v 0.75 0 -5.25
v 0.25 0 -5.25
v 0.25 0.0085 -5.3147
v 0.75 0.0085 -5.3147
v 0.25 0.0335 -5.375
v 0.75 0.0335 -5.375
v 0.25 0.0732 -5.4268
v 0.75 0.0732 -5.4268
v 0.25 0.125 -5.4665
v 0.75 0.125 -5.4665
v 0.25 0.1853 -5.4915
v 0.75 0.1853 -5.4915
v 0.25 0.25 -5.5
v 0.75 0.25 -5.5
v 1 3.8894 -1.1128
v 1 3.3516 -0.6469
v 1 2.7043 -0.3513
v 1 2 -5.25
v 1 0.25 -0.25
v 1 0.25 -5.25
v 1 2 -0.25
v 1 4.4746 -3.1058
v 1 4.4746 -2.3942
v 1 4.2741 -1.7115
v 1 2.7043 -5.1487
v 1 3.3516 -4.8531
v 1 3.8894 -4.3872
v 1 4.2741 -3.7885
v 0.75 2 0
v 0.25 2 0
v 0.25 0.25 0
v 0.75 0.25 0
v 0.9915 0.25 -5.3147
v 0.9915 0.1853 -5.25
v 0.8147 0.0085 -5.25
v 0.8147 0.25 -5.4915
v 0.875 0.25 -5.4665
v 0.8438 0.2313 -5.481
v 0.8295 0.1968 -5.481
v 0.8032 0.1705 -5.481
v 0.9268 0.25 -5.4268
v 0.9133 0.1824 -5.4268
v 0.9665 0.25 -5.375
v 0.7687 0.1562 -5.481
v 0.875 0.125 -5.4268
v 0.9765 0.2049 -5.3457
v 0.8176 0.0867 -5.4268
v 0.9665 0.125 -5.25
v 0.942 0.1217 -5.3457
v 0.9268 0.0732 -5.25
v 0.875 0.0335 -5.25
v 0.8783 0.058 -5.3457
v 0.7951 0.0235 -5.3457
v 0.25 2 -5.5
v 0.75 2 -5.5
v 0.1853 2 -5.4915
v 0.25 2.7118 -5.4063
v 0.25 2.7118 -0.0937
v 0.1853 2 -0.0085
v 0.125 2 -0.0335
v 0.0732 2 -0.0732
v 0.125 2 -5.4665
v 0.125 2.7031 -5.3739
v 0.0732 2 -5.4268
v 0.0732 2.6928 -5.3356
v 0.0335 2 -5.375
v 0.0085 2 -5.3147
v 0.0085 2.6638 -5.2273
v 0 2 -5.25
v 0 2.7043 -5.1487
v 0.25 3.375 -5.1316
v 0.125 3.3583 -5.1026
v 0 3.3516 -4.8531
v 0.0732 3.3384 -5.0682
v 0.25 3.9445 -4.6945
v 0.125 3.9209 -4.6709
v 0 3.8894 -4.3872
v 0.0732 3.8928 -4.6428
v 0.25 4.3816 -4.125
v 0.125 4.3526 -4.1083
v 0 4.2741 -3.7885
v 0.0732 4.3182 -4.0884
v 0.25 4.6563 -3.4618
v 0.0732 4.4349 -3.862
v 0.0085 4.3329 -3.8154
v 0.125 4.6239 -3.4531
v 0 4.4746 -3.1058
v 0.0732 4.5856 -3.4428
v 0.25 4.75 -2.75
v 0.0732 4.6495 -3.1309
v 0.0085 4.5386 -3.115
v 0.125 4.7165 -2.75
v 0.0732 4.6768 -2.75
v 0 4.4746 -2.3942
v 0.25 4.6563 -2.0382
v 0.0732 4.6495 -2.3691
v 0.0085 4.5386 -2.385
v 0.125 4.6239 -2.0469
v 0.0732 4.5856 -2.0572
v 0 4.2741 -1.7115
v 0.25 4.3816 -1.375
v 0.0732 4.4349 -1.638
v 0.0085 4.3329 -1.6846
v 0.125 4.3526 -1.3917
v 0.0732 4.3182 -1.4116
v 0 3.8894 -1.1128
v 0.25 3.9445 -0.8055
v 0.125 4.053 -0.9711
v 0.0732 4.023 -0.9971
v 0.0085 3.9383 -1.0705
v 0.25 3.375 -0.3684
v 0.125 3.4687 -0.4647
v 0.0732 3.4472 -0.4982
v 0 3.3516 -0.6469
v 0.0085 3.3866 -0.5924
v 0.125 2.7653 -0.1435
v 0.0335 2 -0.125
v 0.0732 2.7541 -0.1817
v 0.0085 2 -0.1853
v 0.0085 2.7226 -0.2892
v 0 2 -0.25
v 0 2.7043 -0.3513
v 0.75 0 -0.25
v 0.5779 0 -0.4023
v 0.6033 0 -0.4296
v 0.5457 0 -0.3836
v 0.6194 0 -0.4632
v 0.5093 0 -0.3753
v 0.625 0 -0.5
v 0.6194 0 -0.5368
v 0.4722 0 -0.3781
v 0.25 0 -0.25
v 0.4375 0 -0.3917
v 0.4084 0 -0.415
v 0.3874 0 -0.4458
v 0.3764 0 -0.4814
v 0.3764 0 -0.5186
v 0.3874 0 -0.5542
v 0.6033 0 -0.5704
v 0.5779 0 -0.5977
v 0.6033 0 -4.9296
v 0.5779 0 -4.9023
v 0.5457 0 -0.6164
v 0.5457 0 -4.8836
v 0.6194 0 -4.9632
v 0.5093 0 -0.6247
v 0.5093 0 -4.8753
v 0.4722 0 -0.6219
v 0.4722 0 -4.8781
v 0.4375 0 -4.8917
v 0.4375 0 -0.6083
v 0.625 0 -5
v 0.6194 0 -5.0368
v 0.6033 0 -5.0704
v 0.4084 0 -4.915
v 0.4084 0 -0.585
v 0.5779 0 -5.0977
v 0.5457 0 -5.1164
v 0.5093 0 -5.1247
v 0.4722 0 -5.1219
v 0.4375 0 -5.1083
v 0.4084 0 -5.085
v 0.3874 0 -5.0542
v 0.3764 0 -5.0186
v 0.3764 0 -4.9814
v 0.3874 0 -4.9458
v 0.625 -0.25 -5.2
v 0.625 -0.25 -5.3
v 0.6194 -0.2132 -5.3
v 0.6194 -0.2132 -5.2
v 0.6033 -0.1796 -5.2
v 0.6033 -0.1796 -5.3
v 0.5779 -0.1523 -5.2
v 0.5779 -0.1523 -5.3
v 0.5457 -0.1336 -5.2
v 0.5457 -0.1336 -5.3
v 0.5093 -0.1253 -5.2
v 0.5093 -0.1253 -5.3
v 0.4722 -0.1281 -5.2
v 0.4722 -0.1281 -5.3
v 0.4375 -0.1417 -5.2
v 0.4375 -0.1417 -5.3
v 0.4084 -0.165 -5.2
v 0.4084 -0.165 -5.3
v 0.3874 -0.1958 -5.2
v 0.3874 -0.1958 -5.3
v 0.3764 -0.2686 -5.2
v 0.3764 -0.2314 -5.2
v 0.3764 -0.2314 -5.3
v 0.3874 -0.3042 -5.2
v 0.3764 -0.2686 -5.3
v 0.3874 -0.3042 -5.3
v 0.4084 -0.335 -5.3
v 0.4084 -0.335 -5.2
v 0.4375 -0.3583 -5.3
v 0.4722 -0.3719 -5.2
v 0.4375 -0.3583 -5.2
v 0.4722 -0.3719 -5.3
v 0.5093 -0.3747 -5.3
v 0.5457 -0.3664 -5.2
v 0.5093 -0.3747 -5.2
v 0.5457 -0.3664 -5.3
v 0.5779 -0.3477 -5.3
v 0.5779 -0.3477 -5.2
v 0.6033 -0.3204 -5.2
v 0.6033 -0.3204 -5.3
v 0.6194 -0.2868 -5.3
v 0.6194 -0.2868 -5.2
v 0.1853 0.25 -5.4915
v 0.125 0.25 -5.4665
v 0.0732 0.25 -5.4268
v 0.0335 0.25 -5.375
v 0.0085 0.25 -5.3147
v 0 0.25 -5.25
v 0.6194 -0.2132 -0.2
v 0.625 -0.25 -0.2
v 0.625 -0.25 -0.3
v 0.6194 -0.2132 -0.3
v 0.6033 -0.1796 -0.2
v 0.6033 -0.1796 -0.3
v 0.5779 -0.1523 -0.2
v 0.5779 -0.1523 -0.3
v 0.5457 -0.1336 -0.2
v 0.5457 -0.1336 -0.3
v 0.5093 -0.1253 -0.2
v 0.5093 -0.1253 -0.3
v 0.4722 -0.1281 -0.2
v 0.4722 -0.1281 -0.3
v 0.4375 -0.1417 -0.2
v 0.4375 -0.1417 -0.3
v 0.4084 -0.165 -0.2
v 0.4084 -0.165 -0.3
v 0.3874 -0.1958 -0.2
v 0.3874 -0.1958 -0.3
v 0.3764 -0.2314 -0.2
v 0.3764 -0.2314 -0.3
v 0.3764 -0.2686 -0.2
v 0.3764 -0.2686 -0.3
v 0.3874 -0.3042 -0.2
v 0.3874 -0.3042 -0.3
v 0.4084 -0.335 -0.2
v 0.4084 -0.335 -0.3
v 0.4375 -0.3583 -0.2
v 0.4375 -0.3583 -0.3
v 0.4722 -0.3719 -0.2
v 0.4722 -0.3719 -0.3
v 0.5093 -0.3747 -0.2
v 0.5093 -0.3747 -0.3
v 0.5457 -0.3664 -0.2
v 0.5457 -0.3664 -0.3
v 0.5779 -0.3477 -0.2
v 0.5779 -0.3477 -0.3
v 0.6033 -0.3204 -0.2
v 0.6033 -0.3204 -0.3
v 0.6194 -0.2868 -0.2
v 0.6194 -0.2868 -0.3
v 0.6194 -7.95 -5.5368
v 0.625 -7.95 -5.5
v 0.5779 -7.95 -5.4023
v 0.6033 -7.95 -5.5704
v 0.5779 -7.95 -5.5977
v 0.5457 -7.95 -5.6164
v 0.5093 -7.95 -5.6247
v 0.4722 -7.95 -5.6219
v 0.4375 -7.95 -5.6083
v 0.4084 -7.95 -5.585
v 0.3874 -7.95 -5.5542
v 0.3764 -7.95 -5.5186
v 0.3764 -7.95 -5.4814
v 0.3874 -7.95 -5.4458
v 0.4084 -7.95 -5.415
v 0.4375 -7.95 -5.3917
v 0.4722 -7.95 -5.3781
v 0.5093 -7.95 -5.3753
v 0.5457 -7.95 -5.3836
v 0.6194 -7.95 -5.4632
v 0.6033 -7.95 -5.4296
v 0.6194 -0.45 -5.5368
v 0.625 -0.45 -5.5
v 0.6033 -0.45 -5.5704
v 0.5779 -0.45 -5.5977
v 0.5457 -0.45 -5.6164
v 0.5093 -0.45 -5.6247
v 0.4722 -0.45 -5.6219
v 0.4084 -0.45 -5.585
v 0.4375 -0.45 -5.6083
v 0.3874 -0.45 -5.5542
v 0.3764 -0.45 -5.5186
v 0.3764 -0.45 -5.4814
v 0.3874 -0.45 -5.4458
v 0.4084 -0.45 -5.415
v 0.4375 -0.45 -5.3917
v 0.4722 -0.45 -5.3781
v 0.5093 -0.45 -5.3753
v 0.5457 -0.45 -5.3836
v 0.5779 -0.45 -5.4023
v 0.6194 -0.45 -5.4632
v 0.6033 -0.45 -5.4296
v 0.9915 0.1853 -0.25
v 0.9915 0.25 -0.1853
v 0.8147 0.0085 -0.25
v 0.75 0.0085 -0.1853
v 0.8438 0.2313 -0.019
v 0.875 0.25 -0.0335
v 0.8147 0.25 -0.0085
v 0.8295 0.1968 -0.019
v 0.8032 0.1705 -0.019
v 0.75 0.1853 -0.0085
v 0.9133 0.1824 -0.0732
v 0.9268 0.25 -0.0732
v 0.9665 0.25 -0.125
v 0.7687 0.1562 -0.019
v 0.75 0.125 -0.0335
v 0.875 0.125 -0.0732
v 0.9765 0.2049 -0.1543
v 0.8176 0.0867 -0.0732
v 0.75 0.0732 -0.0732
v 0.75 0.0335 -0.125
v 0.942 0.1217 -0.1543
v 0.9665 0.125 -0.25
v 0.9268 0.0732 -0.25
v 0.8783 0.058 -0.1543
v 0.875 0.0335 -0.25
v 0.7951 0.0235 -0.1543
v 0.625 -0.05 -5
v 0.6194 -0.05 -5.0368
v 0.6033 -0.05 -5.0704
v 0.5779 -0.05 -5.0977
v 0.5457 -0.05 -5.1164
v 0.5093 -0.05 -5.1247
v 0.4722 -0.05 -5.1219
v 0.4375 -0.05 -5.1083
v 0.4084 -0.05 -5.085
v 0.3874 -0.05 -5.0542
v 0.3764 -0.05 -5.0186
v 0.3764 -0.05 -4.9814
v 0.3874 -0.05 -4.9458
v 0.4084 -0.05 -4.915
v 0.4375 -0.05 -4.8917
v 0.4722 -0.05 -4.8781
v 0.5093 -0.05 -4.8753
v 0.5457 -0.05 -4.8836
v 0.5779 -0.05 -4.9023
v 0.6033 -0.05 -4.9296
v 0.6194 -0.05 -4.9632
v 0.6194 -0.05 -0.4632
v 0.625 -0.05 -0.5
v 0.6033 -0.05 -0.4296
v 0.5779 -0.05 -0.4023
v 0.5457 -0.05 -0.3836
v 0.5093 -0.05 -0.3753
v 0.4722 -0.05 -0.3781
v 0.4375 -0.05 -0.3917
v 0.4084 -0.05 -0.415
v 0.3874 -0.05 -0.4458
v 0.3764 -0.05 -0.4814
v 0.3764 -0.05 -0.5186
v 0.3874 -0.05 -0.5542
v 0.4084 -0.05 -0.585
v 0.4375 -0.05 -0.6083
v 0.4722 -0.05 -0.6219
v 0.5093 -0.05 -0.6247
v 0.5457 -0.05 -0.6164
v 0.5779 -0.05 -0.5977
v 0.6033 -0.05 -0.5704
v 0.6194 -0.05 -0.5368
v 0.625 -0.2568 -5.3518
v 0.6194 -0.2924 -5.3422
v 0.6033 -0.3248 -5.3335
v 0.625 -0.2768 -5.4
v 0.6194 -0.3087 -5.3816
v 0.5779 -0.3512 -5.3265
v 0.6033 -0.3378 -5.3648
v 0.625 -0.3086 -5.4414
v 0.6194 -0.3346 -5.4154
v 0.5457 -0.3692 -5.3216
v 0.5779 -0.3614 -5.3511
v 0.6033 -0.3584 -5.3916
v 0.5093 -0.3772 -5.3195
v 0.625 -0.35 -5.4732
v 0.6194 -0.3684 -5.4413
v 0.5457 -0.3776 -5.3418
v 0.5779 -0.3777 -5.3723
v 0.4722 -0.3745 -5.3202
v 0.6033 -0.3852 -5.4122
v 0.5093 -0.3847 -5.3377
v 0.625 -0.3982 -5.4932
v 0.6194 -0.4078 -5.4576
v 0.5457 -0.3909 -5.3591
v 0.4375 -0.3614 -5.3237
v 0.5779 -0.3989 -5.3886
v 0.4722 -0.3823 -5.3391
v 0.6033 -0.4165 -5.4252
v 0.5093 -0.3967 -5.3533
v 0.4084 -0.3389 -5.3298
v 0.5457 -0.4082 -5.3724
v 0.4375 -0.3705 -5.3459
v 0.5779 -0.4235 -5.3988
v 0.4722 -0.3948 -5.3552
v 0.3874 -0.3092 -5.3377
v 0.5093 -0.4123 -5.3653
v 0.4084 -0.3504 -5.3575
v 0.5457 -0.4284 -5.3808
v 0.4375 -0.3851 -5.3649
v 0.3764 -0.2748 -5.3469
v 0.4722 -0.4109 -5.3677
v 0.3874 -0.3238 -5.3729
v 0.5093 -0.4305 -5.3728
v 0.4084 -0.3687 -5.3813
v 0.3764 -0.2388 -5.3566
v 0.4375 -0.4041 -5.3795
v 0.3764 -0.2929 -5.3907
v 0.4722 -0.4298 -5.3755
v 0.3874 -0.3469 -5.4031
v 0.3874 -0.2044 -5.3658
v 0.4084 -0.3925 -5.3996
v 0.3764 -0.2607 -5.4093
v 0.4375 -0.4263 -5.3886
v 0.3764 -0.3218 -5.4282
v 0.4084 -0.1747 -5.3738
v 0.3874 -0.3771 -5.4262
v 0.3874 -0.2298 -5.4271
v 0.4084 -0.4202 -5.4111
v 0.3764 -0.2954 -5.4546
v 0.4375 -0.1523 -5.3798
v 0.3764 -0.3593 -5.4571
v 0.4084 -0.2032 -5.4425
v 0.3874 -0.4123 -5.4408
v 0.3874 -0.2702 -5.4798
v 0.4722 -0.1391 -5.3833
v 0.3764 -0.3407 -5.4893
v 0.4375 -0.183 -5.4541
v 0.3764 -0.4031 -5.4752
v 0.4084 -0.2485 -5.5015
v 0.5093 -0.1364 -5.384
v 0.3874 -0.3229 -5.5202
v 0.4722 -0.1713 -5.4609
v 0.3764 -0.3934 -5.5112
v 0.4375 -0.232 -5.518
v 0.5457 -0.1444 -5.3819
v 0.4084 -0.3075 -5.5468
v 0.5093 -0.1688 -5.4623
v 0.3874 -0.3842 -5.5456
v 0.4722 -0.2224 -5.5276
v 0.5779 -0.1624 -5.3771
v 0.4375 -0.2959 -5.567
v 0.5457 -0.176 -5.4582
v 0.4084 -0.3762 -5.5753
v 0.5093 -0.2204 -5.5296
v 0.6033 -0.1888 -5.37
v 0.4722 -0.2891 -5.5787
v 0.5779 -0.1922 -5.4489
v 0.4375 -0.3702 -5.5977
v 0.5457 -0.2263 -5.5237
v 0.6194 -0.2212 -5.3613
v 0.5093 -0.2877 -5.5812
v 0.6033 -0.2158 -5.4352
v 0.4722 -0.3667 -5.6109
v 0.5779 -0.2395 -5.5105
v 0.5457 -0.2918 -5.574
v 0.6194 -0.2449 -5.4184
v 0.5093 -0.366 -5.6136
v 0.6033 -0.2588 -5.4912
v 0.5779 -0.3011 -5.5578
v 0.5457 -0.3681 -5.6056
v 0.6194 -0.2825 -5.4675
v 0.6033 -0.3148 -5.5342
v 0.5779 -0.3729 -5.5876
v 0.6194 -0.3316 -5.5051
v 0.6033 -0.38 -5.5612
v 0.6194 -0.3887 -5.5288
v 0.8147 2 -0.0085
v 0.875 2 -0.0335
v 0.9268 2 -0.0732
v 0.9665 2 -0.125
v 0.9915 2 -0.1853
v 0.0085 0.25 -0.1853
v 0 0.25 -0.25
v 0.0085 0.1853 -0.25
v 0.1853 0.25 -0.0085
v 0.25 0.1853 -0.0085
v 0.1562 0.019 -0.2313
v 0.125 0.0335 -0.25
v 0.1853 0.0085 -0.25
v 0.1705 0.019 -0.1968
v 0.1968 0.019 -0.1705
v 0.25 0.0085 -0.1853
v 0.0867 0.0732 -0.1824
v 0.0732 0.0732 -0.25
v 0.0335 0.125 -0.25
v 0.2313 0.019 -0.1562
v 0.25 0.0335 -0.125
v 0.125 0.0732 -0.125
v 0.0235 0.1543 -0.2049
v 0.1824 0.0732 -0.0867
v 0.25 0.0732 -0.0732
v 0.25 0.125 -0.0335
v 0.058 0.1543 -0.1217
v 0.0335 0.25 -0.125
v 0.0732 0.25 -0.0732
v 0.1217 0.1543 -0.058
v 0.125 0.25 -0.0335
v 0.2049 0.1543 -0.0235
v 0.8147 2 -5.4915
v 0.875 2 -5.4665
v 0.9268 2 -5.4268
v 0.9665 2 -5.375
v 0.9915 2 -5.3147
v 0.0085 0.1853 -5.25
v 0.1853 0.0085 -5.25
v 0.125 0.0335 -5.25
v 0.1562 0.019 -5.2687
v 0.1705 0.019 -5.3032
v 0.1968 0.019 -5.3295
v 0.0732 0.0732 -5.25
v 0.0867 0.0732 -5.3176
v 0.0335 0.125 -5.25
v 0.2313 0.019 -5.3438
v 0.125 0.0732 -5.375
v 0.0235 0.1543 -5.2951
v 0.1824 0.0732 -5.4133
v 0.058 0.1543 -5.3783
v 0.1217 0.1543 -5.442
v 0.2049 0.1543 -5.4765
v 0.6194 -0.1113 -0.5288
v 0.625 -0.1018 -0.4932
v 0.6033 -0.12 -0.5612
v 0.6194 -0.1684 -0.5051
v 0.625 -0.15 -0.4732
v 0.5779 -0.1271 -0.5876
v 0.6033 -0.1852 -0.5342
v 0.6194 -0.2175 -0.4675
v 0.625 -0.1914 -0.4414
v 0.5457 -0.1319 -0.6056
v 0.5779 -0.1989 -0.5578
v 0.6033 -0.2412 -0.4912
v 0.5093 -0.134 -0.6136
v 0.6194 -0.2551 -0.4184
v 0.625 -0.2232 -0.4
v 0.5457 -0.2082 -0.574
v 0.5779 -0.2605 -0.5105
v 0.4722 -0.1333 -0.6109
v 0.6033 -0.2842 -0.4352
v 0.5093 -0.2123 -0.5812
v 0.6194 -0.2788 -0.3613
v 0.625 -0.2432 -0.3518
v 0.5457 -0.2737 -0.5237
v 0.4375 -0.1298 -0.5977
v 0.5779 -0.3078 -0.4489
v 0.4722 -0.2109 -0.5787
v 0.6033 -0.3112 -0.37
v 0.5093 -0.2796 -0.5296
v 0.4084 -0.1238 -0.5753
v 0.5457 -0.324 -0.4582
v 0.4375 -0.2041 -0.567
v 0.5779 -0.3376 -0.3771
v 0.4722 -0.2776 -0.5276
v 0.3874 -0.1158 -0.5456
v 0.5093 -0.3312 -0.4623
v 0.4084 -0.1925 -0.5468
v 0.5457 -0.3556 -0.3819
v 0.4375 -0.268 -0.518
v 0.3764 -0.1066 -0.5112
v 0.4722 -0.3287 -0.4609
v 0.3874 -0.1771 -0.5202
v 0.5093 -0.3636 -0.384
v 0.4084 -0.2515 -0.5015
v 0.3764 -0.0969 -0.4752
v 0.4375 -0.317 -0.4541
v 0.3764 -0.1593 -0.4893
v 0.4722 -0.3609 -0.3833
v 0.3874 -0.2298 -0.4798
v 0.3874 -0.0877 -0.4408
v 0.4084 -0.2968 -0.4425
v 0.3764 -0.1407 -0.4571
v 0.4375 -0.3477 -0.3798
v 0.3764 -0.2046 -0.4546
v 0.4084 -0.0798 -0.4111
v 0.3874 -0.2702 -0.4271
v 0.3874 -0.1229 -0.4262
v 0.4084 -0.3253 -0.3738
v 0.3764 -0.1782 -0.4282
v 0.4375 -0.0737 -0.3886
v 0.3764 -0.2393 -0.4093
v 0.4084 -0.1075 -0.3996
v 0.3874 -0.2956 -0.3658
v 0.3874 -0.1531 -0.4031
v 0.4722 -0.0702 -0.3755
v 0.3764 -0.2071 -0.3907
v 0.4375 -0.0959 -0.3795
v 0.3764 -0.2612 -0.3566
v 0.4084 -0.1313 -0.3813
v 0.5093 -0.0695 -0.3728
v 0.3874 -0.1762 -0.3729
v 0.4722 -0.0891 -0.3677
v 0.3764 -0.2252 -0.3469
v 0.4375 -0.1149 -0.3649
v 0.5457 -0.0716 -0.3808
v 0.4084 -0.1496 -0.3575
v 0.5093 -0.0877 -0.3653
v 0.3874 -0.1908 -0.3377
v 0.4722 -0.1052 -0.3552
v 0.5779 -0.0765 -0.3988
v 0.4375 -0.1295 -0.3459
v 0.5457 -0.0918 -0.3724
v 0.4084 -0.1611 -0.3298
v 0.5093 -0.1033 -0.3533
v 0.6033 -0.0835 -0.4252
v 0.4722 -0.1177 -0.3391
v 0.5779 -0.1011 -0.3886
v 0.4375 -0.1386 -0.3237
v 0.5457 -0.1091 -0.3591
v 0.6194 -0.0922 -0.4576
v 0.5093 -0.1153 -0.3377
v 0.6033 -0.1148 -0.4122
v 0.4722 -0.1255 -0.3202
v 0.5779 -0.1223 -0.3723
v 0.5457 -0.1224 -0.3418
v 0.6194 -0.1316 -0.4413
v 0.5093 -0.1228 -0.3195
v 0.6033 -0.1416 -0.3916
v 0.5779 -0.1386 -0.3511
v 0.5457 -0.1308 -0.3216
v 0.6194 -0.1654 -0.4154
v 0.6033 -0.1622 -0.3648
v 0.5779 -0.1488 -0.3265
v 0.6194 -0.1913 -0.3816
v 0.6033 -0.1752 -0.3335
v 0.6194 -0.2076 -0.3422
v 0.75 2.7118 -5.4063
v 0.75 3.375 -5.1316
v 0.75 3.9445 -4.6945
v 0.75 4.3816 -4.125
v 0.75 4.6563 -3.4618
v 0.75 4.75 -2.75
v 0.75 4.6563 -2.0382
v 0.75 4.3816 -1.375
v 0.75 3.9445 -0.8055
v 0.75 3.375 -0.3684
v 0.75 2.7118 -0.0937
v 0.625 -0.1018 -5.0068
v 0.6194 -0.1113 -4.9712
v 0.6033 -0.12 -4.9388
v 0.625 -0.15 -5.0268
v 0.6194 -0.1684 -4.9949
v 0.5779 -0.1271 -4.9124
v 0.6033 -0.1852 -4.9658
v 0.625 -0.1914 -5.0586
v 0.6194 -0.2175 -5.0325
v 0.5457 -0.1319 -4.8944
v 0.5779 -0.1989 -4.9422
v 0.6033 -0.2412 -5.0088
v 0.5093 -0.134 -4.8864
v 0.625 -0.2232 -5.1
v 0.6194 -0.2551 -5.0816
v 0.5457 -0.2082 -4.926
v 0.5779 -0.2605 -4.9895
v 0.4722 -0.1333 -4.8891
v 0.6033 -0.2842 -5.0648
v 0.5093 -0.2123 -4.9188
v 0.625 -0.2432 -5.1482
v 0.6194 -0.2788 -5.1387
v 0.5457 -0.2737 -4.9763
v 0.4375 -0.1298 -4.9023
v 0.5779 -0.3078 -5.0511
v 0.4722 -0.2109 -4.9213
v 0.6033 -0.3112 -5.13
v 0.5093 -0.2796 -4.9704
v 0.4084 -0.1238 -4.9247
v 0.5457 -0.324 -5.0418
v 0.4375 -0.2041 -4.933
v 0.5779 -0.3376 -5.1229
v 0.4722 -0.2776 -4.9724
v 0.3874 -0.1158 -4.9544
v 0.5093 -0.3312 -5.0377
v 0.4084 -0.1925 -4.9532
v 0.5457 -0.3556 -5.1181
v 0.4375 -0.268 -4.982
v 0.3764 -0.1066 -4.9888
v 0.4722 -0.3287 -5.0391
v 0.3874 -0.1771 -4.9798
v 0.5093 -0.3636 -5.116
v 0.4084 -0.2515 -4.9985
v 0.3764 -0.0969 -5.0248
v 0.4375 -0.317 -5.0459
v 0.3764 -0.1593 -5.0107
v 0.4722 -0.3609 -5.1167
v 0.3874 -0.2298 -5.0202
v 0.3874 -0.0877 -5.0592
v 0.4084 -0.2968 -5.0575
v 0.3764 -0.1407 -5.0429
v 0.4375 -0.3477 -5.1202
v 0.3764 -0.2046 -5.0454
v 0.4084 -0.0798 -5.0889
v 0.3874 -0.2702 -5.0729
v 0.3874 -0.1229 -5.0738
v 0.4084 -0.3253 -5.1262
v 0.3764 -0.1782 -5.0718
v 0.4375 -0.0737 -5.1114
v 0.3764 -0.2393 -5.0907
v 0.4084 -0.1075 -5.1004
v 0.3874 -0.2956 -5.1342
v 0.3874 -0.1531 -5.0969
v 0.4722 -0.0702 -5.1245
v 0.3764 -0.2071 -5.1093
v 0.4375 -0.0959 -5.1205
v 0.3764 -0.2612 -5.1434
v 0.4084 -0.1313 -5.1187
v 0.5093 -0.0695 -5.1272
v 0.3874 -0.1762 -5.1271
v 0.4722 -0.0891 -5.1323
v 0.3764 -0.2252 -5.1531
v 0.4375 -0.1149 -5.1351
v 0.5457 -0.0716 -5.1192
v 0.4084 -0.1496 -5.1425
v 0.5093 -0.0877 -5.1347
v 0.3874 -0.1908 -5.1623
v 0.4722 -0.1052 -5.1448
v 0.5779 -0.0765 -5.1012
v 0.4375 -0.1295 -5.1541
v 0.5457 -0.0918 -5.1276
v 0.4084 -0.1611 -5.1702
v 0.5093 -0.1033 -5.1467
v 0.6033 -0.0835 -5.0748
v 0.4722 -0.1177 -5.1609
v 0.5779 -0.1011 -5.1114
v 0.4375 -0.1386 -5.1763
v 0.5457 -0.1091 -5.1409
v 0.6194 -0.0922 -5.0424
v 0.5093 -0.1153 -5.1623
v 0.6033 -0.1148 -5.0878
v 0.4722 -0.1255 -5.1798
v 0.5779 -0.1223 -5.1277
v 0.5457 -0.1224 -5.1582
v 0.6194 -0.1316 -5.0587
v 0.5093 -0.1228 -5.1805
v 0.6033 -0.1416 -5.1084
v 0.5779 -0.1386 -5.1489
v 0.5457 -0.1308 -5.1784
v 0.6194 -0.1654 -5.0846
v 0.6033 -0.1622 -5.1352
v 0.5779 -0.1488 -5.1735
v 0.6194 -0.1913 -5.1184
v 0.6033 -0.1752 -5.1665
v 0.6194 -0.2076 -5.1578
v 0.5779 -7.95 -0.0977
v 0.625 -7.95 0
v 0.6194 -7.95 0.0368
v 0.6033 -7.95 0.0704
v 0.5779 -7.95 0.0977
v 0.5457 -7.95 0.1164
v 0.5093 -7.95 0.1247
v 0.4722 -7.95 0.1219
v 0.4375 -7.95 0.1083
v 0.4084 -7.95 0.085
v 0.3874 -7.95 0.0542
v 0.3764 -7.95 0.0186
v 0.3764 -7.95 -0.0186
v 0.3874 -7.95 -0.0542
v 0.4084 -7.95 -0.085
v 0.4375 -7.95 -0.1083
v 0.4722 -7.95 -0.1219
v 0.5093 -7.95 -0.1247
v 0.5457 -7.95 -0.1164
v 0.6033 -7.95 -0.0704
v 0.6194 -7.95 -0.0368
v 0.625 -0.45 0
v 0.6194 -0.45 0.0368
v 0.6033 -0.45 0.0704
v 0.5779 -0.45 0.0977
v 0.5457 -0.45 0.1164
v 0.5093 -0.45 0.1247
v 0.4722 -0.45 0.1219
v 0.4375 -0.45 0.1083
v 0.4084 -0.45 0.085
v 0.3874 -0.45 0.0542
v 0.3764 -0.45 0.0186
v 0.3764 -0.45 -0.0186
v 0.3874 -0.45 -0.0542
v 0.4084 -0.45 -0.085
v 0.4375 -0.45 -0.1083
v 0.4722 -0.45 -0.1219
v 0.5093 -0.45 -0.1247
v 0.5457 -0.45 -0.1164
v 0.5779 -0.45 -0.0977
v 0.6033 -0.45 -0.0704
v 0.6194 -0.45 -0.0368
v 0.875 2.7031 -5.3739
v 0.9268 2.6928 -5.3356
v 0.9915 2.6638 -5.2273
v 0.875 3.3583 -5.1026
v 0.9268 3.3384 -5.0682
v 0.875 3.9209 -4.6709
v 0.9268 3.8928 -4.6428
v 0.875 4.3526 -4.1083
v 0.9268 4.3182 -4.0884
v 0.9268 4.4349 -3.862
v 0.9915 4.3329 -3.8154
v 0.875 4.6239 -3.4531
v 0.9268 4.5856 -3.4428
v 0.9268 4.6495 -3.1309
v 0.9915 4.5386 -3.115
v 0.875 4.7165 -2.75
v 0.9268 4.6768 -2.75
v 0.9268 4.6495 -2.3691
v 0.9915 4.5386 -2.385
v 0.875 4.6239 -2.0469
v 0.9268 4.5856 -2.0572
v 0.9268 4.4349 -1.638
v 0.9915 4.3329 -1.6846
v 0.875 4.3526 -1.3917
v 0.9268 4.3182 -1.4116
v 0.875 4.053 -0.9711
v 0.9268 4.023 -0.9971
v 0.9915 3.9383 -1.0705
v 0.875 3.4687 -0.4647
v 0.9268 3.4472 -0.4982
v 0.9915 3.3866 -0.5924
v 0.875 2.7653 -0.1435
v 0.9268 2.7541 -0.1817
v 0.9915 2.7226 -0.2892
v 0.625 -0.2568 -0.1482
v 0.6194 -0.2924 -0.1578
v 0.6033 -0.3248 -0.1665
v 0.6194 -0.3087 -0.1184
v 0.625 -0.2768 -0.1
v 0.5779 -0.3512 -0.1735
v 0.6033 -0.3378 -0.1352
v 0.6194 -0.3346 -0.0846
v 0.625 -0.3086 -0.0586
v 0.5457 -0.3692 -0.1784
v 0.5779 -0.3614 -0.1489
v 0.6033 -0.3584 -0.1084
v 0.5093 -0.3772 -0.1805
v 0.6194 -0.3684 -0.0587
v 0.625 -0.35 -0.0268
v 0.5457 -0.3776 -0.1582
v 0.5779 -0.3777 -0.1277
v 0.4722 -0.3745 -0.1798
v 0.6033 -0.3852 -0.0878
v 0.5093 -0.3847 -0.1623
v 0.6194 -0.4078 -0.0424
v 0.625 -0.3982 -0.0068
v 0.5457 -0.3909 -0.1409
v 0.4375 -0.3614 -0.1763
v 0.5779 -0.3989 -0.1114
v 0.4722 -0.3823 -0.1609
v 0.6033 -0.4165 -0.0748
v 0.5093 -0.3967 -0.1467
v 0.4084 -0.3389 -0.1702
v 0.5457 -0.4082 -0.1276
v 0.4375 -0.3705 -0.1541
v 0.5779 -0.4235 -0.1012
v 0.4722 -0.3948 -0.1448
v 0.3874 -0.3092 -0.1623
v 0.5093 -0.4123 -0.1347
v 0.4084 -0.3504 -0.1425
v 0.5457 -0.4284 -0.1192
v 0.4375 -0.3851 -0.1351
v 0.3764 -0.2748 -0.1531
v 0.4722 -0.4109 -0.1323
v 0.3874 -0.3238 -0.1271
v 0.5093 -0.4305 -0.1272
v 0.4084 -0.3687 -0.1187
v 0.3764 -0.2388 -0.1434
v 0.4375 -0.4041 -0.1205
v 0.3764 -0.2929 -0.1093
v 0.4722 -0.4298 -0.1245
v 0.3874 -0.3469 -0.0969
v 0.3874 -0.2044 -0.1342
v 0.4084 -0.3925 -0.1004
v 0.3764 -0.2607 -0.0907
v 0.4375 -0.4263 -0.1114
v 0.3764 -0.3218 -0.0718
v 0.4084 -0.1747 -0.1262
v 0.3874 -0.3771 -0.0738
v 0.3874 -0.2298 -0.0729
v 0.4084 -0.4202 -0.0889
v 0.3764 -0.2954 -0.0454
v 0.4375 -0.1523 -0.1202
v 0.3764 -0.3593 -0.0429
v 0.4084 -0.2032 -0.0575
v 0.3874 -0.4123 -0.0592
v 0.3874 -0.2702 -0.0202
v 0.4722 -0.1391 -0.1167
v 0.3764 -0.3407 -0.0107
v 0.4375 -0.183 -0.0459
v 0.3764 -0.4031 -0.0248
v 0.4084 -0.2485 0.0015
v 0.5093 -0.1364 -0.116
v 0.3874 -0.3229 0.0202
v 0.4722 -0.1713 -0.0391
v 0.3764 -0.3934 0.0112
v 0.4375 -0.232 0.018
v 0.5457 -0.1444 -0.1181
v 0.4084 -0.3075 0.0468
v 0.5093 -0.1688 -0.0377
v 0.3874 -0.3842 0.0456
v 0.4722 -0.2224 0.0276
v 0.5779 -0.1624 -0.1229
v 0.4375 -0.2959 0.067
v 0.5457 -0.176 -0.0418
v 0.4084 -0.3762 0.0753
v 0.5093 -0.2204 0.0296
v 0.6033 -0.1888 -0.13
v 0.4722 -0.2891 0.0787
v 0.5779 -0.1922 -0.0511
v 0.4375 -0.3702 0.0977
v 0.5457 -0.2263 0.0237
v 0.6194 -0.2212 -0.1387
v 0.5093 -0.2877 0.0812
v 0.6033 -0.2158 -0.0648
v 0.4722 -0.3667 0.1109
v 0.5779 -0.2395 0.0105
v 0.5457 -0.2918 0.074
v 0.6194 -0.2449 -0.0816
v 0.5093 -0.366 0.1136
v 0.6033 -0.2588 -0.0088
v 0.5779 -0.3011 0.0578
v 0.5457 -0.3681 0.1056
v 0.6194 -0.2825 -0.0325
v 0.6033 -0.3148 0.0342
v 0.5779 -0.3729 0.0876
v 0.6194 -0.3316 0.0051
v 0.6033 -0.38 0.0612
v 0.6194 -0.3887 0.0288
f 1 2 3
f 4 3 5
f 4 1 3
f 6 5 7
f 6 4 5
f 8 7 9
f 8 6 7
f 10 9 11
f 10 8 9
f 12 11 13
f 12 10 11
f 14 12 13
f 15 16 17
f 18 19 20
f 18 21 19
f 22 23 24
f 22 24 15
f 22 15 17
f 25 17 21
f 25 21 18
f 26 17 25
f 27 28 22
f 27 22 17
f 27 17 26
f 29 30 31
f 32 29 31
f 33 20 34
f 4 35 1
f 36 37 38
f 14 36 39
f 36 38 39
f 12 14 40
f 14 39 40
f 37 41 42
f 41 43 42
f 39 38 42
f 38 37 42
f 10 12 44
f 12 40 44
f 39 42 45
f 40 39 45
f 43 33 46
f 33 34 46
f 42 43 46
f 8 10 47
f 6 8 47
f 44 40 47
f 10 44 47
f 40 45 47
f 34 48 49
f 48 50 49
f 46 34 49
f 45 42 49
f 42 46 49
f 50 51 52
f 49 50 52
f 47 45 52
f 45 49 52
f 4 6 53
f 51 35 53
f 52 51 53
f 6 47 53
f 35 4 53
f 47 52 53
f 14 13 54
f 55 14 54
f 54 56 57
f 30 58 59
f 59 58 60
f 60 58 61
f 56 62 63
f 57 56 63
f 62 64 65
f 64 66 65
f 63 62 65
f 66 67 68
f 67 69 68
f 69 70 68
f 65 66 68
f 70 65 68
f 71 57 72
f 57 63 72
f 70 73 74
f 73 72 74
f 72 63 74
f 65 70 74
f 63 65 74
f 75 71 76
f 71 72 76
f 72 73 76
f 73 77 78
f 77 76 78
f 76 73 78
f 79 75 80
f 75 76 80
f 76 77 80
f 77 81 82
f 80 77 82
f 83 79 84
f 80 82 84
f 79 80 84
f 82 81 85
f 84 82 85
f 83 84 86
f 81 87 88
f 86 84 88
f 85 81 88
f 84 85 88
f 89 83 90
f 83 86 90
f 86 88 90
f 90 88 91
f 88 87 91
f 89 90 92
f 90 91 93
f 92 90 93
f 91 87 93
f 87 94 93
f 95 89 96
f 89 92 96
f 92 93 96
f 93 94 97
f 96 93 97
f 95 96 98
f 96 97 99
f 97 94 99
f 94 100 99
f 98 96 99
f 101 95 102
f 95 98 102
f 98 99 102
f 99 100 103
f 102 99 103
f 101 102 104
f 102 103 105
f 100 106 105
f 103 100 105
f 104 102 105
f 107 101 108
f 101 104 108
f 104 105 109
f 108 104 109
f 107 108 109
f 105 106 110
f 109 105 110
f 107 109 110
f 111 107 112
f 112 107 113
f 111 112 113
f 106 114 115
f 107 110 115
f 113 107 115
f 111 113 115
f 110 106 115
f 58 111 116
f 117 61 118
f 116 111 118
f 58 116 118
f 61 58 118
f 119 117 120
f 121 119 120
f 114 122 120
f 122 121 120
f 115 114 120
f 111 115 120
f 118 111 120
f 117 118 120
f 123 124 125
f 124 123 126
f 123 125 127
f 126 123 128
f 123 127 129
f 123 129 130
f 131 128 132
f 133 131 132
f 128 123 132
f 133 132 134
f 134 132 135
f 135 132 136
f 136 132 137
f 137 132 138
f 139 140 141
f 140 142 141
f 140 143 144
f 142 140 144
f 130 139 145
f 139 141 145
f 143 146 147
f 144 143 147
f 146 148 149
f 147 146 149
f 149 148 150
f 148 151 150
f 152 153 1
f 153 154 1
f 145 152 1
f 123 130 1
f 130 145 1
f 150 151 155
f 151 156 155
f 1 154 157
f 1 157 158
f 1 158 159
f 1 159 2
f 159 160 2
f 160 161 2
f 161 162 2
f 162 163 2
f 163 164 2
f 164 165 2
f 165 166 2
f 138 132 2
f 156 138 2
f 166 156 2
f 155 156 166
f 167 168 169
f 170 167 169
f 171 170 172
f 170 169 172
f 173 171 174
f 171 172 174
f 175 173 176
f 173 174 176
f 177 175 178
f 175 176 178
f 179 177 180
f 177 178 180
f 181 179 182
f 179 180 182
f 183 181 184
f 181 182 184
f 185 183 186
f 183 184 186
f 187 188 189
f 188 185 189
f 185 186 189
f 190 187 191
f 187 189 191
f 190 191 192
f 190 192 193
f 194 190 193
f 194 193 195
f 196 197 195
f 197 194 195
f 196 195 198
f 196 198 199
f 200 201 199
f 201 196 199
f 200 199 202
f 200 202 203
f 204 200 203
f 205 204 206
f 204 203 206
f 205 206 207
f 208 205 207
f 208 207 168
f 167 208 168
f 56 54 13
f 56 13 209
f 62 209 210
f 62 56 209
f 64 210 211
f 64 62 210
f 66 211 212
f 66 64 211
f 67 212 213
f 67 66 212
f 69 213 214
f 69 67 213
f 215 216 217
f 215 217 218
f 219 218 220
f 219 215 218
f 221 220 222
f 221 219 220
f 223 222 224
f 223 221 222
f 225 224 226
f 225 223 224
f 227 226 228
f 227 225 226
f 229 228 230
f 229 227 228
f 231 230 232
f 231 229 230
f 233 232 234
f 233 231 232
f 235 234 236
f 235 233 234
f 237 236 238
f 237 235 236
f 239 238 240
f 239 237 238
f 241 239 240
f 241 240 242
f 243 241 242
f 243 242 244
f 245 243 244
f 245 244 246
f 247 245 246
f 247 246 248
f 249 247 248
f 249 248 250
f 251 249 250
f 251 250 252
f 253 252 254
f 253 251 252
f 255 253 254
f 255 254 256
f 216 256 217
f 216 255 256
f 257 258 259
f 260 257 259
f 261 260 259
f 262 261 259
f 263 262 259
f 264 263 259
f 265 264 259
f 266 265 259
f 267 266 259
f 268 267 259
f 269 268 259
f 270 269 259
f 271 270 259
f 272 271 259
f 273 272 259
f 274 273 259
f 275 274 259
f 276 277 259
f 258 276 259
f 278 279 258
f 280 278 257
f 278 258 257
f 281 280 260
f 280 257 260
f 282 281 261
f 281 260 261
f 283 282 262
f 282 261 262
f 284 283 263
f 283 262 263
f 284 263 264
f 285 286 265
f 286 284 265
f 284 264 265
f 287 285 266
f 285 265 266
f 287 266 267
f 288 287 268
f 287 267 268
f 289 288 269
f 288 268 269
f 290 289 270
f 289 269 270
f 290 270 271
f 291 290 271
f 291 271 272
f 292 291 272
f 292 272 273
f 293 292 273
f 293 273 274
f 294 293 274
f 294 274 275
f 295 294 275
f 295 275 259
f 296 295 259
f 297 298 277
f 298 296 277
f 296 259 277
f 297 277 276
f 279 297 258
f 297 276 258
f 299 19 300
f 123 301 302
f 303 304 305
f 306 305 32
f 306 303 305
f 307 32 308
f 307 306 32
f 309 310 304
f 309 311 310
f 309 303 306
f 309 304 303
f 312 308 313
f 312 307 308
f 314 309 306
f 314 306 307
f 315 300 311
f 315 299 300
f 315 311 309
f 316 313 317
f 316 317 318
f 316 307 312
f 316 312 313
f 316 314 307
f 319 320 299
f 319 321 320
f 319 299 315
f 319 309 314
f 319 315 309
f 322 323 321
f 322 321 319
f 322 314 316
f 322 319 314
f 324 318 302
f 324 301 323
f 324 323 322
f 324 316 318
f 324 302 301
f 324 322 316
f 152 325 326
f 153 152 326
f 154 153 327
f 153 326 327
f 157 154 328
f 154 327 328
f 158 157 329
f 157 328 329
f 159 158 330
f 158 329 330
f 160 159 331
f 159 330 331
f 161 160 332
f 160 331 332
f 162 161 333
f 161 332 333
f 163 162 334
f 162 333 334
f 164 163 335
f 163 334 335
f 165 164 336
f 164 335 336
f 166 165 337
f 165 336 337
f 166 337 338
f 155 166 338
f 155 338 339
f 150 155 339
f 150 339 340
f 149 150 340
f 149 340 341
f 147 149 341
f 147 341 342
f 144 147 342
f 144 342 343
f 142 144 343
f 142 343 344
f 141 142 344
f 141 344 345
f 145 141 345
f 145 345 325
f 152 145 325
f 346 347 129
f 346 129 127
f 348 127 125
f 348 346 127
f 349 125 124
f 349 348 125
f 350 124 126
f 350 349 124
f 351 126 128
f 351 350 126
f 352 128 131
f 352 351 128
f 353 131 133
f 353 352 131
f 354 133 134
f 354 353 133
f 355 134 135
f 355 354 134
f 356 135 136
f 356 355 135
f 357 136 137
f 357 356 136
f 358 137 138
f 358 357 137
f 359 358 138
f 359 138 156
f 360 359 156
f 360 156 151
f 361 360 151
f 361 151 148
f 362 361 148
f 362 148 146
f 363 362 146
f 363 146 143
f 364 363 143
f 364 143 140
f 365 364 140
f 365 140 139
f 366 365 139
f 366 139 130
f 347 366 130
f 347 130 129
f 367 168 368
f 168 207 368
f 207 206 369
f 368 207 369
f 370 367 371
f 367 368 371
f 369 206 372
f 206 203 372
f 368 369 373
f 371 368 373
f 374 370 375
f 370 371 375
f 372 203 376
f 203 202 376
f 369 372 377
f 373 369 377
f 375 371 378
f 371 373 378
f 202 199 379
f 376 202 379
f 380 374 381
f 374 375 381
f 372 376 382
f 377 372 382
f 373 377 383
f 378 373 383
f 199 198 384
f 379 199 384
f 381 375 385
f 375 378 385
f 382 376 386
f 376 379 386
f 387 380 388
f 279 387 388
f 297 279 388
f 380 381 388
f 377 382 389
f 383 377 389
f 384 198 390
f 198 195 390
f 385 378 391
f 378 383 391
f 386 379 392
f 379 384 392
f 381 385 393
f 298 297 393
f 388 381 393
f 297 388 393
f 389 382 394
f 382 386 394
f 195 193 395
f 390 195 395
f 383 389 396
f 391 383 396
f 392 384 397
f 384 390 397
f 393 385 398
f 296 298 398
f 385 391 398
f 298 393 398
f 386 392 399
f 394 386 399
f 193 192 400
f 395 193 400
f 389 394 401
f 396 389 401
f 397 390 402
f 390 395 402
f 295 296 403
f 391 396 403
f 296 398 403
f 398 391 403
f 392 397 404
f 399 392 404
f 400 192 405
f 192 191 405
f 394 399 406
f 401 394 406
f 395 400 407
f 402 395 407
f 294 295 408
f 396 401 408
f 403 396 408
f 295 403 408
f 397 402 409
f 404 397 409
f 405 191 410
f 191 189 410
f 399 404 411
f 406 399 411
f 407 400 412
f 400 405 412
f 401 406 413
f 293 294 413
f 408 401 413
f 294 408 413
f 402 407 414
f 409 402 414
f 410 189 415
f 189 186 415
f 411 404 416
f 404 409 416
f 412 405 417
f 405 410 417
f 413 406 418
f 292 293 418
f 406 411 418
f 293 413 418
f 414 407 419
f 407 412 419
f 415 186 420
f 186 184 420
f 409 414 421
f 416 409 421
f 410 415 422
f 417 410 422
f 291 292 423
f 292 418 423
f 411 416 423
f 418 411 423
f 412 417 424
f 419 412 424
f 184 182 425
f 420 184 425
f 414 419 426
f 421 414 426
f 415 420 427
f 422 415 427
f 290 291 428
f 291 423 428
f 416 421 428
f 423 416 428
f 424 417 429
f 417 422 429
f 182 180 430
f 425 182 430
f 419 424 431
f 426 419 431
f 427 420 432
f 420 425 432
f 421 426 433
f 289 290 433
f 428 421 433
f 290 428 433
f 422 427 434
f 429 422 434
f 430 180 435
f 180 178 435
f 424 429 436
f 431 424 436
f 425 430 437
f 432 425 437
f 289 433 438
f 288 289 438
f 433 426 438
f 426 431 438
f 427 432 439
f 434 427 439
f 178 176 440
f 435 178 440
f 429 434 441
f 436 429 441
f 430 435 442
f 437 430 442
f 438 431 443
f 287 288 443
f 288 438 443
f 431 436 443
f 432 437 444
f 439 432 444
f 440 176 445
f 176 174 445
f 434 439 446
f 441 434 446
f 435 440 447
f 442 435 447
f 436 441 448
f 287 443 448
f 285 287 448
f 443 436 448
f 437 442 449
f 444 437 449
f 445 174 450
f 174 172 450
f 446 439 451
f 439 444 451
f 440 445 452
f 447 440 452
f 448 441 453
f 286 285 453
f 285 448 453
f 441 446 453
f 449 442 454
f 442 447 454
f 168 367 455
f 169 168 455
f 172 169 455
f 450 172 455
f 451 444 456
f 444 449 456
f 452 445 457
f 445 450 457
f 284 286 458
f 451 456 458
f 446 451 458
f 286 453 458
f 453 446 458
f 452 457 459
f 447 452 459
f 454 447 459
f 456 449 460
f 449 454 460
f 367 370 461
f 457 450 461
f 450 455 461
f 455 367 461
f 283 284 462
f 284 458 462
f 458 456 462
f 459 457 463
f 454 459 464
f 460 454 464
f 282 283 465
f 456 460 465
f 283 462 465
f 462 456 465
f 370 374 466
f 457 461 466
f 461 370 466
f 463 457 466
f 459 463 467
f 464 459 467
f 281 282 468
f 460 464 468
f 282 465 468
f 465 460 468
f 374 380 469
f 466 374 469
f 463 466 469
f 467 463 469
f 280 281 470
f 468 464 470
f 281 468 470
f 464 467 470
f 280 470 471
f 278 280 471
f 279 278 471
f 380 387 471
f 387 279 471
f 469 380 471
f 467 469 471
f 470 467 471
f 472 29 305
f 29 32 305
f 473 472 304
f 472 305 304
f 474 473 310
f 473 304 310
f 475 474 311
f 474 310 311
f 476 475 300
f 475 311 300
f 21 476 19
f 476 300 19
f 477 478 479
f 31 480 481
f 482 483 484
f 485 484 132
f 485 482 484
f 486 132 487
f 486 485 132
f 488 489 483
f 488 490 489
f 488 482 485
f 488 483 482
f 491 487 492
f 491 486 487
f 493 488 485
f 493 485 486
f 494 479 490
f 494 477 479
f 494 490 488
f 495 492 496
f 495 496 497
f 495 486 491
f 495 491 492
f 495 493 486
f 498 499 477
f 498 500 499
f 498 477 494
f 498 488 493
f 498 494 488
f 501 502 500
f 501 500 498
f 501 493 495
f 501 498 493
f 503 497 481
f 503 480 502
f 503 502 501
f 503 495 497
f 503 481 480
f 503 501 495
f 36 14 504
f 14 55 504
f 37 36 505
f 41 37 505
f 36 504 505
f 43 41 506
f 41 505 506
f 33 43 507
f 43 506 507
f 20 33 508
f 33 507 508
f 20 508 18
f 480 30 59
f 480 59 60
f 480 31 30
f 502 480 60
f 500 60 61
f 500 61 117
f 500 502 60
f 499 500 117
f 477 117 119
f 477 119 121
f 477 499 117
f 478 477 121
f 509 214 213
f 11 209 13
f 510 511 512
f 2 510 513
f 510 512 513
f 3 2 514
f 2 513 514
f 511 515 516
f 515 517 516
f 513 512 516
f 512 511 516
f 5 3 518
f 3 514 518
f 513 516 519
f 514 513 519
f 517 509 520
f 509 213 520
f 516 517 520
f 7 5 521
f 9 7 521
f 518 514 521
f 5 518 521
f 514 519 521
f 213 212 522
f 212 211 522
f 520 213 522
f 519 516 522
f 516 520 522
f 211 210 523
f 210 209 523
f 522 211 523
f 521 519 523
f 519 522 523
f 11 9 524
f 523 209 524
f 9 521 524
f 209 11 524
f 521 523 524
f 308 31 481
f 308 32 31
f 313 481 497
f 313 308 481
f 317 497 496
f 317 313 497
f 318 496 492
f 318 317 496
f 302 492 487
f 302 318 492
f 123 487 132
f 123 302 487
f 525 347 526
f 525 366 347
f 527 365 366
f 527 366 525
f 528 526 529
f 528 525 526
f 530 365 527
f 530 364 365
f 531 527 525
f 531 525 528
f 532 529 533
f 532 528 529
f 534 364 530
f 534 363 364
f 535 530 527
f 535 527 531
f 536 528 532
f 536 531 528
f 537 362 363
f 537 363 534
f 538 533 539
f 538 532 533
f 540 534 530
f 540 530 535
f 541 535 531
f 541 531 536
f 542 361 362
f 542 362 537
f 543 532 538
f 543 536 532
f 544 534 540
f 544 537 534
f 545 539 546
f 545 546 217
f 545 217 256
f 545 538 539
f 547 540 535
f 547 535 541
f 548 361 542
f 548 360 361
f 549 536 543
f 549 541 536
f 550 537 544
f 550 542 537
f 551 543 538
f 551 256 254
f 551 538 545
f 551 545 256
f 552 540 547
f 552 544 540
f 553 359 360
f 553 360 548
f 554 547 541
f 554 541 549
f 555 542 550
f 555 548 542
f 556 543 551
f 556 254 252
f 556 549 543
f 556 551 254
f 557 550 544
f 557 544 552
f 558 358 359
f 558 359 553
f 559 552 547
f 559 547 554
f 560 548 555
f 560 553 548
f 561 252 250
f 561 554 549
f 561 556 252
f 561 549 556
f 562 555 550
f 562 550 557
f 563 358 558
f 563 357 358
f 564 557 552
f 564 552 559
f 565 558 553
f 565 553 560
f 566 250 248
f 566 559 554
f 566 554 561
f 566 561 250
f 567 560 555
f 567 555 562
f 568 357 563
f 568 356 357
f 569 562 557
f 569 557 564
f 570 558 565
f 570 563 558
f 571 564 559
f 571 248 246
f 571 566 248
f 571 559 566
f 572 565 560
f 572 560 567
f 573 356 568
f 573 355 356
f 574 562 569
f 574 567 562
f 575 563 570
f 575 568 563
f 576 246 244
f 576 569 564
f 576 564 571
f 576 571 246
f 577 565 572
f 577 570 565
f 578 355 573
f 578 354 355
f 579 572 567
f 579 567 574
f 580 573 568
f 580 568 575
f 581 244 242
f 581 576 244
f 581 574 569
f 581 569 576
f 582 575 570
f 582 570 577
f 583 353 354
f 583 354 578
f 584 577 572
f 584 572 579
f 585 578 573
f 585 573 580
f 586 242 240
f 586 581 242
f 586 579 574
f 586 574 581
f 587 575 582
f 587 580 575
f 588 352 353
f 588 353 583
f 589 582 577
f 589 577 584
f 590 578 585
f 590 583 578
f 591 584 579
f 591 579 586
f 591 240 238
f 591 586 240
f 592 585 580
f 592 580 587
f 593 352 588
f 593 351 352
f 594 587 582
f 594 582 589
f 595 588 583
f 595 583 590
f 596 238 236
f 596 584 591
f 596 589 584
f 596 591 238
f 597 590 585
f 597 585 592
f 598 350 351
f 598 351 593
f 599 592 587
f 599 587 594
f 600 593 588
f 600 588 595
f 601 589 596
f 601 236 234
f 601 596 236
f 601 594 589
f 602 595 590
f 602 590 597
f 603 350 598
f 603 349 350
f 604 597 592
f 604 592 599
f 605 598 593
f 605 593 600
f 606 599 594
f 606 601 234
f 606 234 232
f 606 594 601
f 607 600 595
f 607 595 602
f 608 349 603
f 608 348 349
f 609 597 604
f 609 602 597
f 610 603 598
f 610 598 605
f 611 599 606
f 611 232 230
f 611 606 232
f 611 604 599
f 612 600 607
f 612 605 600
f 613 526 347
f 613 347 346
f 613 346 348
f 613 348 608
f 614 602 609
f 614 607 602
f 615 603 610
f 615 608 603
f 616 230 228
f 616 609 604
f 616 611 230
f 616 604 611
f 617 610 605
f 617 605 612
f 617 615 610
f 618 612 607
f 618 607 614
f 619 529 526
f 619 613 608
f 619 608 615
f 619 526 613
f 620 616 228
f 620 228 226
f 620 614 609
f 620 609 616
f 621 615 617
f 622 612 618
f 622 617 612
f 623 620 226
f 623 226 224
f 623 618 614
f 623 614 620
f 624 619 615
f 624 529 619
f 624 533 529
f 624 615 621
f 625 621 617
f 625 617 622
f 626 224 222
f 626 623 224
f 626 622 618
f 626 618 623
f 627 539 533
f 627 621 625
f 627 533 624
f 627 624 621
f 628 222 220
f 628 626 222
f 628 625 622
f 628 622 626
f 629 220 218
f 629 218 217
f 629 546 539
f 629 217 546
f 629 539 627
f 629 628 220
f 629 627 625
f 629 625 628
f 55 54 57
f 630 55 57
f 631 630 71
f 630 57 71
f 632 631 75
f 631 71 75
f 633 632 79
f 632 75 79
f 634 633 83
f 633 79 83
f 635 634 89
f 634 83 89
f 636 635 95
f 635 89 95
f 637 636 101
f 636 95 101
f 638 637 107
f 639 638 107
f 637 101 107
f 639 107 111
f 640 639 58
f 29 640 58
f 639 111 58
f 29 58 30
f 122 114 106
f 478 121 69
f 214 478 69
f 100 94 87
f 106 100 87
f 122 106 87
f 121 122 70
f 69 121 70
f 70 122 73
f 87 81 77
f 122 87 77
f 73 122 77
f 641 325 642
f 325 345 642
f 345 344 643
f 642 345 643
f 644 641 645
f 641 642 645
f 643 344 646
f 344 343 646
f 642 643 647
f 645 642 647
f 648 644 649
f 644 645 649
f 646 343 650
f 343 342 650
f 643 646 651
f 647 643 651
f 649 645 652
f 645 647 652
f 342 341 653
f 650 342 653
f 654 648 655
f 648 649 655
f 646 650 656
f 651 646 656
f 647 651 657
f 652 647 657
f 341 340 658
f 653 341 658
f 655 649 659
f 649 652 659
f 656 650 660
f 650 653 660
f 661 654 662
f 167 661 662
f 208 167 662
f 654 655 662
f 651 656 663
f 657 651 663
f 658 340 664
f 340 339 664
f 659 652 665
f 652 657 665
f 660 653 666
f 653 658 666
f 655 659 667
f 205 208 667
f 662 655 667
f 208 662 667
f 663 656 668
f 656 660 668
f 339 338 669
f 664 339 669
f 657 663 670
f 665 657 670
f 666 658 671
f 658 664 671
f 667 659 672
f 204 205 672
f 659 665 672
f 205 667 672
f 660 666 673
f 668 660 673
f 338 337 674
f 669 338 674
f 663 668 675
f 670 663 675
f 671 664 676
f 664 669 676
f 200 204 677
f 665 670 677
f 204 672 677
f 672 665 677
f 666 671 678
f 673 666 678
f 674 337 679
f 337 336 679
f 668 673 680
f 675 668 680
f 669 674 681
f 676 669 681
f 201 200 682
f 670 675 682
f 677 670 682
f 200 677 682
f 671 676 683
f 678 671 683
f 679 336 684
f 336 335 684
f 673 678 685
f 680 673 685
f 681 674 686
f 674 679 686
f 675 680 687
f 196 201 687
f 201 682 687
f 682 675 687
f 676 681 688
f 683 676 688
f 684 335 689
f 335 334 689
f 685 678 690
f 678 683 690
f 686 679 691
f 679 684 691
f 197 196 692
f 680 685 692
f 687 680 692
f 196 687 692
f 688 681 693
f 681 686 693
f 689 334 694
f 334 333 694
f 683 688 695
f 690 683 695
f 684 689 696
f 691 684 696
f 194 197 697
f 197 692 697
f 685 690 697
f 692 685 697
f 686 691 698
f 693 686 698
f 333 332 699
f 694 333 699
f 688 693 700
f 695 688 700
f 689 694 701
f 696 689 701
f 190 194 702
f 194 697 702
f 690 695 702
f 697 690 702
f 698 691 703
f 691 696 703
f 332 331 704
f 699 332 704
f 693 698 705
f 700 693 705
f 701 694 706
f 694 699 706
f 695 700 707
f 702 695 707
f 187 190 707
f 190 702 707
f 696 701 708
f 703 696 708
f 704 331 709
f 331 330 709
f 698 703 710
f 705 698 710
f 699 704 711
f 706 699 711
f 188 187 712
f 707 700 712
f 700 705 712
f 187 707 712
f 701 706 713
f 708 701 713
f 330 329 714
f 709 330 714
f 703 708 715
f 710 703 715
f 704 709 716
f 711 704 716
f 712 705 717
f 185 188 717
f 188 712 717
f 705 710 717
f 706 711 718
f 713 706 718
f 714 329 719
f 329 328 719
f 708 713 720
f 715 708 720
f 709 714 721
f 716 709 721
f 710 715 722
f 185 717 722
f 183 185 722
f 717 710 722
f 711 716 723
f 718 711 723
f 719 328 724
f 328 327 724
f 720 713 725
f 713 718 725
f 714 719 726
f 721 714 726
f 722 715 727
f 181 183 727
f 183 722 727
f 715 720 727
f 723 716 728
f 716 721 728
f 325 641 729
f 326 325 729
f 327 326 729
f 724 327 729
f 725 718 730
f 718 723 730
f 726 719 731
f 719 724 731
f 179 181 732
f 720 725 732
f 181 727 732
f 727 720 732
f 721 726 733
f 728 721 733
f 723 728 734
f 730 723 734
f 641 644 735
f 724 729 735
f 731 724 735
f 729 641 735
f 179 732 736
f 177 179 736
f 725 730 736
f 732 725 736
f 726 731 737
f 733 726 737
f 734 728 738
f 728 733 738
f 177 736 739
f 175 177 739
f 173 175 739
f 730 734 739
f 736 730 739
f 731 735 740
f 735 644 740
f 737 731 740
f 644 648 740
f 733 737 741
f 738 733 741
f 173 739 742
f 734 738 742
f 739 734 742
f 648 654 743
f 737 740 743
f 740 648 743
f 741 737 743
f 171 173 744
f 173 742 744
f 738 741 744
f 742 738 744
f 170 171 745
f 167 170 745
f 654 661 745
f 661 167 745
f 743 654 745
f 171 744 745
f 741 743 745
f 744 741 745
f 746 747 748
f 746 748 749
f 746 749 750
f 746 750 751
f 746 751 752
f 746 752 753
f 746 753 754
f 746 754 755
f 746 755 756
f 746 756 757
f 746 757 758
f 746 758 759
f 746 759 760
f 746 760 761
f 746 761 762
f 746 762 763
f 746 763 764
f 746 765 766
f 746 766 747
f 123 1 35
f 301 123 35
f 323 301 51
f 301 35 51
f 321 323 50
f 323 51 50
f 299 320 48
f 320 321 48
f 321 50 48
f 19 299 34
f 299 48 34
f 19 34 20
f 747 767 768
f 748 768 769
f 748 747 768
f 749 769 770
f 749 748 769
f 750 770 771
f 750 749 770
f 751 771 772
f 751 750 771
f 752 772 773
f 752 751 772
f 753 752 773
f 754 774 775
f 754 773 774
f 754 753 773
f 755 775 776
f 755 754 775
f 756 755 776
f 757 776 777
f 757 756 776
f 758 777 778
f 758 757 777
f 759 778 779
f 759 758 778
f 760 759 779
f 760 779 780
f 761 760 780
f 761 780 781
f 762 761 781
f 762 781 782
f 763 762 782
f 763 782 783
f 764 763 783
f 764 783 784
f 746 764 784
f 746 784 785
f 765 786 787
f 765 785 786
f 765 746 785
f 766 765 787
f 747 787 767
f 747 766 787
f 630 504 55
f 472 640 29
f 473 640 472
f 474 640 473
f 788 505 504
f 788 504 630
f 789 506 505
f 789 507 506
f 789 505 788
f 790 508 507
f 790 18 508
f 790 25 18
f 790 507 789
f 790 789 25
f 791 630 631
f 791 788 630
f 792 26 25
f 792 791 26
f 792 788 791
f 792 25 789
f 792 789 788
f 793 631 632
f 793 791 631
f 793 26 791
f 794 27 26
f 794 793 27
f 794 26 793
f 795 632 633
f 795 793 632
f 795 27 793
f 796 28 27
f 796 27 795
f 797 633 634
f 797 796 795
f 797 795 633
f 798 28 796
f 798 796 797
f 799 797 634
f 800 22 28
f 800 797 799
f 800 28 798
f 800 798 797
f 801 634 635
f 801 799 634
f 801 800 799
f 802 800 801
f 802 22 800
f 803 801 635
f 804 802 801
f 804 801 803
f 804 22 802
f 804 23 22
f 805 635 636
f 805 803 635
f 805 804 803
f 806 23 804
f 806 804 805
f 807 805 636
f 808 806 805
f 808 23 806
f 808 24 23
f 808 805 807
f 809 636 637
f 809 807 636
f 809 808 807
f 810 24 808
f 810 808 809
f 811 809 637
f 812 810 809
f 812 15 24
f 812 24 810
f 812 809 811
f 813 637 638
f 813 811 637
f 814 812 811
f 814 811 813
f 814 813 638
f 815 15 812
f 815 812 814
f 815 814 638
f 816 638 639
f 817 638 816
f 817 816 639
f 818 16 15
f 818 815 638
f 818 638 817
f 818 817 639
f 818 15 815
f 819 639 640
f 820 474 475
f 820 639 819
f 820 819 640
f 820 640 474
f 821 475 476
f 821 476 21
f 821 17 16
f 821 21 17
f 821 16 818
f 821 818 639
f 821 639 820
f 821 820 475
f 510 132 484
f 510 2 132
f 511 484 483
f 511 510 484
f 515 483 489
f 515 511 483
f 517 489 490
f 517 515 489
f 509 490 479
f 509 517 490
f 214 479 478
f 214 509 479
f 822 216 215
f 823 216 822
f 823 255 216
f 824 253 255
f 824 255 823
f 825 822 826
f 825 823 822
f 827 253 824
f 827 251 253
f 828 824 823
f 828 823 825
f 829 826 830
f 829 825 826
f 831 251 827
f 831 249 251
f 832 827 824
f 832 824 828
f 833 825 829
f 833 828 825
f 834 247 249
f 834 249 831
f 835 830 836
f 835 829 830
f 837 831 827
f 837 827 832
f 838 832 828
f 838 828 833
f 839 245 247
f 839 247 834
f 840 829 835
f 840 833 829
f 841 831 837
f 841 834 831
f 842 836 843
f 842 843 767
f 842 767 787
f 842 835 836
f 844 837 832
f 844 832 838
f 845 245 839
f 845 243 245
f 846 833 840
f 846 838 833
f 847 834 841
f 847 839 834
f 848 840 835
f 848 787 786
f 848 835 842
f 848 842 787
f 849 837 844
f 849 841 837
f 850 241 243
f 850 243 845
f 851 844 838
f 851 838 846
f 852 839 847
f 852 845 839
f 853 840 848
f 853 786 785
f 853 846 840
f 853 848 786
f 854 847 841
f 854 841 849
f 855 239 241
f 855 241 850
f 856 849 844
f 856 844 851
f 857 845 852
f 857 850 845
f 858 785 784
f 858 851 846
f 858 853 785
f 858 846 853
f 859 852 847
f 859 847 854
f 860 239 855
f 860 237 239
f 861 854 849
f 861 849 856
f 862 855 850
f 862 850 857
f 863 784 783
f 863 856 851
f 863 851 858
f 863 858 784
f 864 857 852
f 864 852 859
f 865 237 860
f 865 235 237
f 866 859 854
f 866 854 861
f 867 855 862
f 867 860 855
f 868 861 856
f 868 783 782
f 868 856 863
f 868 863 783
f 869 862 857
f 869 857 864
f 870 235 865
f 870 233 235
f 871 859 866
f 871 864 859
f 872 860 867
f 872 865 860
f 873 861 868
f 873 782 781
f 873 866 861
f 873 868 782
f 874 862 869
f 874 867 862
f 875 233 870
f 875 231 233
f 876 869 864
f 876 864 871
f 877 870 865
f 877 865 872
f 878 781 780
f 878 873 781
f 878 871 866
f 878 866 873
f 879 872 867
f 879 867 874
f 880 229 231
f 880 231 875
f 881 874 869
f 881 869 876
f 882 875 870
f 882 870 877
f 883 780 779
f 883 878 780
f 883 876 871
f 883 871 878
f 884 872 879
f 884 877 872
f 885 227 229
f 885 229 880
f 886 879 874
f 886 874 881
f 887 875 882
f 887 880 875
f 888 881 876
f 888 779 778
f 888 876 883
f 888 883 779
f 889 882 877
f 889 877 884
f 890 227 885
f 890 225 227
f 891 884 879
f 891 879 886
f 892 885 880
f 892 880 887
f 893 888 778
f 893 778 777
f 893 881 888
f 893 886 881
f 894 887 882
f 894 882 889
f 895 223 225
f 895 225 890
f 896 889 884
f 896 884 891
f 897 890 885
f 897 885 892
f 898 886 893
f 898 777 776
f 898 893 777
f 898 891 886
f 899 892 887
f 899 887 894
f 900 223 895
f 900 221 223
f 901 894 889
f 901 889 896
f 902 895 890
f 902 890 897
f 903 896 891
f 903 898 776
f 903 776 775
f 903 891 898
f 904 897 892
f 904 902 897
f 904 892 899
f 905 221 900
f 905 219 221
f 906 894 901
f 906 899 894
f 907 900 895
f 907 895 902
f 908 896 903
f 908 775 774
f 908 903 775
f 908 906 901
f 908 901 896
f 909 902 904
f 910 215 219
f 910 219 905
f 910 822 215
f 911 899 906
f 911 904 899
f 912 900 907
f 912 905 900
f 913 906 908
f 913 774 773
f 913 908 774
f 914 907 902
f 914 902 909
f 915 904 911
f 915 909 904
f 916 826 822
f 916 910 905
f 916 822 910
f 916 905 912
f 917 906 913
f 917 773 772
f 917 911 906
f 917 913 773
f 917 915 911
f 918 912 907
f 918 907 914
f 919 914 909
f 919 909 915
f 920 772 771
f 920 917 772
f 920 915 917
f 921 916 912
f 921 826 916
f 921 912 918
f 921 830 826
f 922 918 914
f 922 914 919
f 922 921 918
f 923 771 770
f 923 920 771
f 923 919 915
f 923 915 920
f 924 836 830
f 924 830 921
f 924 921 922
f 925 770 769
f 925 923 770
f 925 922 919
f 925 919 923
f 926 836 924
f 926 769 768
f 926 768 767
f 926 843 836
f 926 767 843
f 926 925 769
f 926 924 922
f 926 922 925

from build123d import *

# Parameters (mm, degrees)
BOSS_EXTRUDE1_DEPTH = 1
FILLET3_R           = 0.25
SKETCH3_R           = 0.125


with BuildPart() as part:
    # Sketch1 → Boss-Extrude1 (new body)
    with BuildSketch(Plane(origin=(0, 0, 0), x_dir=(0, 0, -1), z_dir=(1, 0, 0))):
        with BuildLine():
            Line((0, 2), (0, 0))
            Line((0, 0), (5.5, 0))
            Line((5.5, 0), (5.5, 2))
            ThreePointArc((5.5, 2), (2.75, 4.75), (0, 2))
        make_face()
    extrude(amount=BOSS_EXTRUDE1_DEPTH)

    # Fillet3
    fillet3_edges = [part.edges().sort_by_distance(p)[0] for p in [
        (1, 0, -2.75),
        (1, 1, -5.5),
        (1, 4.75, -2.75),
        (0, 1, -5.5),
        (0, 0, -2.75),
        (0, 1, 0),
        (0, 4.75, -2.75),
        (1, 1, 0),
        (0.5, 0, -5.5),
        (0.5, 0, 0),
    ]]
    fillet(fillet3_edges, radius=FILLET3_R)

    # Sweep1: sweep along a path in Sketch2
    with BuildLine(Plane(origin=(0.5, 0, 0), x_dir=(0, 0, -1), z_dir=(1, 0, 0))) as sweep1_path:
        Line((0.5, 0), (0.5, -0.05))
        ThreePointArc((0.5, -0.05), (0.441421356, -0.191421356), (0.3, -0.25))
        Line((0.3, -0.25), (0.2, -0.25))
        ThreePointArc((0.2, -0.25), (0.058578644, -0.308578644), (0, -0.45))
        Line((0, -0.45), (0, -7.95))
    # Sketch3 → Sweep1 (sweep)
    with BuildSketch(Plane.XZ):
        with Locations((0.5, -0.5)):
            Circle(SKETCH3_R)
    sweep1 = sweep(path=sweep1_path.line)

    # Mirror1: Sweep1 across plane
    add(sweep1.mirror(Plane.XY.offset(-2.75)))


solid = part.part
